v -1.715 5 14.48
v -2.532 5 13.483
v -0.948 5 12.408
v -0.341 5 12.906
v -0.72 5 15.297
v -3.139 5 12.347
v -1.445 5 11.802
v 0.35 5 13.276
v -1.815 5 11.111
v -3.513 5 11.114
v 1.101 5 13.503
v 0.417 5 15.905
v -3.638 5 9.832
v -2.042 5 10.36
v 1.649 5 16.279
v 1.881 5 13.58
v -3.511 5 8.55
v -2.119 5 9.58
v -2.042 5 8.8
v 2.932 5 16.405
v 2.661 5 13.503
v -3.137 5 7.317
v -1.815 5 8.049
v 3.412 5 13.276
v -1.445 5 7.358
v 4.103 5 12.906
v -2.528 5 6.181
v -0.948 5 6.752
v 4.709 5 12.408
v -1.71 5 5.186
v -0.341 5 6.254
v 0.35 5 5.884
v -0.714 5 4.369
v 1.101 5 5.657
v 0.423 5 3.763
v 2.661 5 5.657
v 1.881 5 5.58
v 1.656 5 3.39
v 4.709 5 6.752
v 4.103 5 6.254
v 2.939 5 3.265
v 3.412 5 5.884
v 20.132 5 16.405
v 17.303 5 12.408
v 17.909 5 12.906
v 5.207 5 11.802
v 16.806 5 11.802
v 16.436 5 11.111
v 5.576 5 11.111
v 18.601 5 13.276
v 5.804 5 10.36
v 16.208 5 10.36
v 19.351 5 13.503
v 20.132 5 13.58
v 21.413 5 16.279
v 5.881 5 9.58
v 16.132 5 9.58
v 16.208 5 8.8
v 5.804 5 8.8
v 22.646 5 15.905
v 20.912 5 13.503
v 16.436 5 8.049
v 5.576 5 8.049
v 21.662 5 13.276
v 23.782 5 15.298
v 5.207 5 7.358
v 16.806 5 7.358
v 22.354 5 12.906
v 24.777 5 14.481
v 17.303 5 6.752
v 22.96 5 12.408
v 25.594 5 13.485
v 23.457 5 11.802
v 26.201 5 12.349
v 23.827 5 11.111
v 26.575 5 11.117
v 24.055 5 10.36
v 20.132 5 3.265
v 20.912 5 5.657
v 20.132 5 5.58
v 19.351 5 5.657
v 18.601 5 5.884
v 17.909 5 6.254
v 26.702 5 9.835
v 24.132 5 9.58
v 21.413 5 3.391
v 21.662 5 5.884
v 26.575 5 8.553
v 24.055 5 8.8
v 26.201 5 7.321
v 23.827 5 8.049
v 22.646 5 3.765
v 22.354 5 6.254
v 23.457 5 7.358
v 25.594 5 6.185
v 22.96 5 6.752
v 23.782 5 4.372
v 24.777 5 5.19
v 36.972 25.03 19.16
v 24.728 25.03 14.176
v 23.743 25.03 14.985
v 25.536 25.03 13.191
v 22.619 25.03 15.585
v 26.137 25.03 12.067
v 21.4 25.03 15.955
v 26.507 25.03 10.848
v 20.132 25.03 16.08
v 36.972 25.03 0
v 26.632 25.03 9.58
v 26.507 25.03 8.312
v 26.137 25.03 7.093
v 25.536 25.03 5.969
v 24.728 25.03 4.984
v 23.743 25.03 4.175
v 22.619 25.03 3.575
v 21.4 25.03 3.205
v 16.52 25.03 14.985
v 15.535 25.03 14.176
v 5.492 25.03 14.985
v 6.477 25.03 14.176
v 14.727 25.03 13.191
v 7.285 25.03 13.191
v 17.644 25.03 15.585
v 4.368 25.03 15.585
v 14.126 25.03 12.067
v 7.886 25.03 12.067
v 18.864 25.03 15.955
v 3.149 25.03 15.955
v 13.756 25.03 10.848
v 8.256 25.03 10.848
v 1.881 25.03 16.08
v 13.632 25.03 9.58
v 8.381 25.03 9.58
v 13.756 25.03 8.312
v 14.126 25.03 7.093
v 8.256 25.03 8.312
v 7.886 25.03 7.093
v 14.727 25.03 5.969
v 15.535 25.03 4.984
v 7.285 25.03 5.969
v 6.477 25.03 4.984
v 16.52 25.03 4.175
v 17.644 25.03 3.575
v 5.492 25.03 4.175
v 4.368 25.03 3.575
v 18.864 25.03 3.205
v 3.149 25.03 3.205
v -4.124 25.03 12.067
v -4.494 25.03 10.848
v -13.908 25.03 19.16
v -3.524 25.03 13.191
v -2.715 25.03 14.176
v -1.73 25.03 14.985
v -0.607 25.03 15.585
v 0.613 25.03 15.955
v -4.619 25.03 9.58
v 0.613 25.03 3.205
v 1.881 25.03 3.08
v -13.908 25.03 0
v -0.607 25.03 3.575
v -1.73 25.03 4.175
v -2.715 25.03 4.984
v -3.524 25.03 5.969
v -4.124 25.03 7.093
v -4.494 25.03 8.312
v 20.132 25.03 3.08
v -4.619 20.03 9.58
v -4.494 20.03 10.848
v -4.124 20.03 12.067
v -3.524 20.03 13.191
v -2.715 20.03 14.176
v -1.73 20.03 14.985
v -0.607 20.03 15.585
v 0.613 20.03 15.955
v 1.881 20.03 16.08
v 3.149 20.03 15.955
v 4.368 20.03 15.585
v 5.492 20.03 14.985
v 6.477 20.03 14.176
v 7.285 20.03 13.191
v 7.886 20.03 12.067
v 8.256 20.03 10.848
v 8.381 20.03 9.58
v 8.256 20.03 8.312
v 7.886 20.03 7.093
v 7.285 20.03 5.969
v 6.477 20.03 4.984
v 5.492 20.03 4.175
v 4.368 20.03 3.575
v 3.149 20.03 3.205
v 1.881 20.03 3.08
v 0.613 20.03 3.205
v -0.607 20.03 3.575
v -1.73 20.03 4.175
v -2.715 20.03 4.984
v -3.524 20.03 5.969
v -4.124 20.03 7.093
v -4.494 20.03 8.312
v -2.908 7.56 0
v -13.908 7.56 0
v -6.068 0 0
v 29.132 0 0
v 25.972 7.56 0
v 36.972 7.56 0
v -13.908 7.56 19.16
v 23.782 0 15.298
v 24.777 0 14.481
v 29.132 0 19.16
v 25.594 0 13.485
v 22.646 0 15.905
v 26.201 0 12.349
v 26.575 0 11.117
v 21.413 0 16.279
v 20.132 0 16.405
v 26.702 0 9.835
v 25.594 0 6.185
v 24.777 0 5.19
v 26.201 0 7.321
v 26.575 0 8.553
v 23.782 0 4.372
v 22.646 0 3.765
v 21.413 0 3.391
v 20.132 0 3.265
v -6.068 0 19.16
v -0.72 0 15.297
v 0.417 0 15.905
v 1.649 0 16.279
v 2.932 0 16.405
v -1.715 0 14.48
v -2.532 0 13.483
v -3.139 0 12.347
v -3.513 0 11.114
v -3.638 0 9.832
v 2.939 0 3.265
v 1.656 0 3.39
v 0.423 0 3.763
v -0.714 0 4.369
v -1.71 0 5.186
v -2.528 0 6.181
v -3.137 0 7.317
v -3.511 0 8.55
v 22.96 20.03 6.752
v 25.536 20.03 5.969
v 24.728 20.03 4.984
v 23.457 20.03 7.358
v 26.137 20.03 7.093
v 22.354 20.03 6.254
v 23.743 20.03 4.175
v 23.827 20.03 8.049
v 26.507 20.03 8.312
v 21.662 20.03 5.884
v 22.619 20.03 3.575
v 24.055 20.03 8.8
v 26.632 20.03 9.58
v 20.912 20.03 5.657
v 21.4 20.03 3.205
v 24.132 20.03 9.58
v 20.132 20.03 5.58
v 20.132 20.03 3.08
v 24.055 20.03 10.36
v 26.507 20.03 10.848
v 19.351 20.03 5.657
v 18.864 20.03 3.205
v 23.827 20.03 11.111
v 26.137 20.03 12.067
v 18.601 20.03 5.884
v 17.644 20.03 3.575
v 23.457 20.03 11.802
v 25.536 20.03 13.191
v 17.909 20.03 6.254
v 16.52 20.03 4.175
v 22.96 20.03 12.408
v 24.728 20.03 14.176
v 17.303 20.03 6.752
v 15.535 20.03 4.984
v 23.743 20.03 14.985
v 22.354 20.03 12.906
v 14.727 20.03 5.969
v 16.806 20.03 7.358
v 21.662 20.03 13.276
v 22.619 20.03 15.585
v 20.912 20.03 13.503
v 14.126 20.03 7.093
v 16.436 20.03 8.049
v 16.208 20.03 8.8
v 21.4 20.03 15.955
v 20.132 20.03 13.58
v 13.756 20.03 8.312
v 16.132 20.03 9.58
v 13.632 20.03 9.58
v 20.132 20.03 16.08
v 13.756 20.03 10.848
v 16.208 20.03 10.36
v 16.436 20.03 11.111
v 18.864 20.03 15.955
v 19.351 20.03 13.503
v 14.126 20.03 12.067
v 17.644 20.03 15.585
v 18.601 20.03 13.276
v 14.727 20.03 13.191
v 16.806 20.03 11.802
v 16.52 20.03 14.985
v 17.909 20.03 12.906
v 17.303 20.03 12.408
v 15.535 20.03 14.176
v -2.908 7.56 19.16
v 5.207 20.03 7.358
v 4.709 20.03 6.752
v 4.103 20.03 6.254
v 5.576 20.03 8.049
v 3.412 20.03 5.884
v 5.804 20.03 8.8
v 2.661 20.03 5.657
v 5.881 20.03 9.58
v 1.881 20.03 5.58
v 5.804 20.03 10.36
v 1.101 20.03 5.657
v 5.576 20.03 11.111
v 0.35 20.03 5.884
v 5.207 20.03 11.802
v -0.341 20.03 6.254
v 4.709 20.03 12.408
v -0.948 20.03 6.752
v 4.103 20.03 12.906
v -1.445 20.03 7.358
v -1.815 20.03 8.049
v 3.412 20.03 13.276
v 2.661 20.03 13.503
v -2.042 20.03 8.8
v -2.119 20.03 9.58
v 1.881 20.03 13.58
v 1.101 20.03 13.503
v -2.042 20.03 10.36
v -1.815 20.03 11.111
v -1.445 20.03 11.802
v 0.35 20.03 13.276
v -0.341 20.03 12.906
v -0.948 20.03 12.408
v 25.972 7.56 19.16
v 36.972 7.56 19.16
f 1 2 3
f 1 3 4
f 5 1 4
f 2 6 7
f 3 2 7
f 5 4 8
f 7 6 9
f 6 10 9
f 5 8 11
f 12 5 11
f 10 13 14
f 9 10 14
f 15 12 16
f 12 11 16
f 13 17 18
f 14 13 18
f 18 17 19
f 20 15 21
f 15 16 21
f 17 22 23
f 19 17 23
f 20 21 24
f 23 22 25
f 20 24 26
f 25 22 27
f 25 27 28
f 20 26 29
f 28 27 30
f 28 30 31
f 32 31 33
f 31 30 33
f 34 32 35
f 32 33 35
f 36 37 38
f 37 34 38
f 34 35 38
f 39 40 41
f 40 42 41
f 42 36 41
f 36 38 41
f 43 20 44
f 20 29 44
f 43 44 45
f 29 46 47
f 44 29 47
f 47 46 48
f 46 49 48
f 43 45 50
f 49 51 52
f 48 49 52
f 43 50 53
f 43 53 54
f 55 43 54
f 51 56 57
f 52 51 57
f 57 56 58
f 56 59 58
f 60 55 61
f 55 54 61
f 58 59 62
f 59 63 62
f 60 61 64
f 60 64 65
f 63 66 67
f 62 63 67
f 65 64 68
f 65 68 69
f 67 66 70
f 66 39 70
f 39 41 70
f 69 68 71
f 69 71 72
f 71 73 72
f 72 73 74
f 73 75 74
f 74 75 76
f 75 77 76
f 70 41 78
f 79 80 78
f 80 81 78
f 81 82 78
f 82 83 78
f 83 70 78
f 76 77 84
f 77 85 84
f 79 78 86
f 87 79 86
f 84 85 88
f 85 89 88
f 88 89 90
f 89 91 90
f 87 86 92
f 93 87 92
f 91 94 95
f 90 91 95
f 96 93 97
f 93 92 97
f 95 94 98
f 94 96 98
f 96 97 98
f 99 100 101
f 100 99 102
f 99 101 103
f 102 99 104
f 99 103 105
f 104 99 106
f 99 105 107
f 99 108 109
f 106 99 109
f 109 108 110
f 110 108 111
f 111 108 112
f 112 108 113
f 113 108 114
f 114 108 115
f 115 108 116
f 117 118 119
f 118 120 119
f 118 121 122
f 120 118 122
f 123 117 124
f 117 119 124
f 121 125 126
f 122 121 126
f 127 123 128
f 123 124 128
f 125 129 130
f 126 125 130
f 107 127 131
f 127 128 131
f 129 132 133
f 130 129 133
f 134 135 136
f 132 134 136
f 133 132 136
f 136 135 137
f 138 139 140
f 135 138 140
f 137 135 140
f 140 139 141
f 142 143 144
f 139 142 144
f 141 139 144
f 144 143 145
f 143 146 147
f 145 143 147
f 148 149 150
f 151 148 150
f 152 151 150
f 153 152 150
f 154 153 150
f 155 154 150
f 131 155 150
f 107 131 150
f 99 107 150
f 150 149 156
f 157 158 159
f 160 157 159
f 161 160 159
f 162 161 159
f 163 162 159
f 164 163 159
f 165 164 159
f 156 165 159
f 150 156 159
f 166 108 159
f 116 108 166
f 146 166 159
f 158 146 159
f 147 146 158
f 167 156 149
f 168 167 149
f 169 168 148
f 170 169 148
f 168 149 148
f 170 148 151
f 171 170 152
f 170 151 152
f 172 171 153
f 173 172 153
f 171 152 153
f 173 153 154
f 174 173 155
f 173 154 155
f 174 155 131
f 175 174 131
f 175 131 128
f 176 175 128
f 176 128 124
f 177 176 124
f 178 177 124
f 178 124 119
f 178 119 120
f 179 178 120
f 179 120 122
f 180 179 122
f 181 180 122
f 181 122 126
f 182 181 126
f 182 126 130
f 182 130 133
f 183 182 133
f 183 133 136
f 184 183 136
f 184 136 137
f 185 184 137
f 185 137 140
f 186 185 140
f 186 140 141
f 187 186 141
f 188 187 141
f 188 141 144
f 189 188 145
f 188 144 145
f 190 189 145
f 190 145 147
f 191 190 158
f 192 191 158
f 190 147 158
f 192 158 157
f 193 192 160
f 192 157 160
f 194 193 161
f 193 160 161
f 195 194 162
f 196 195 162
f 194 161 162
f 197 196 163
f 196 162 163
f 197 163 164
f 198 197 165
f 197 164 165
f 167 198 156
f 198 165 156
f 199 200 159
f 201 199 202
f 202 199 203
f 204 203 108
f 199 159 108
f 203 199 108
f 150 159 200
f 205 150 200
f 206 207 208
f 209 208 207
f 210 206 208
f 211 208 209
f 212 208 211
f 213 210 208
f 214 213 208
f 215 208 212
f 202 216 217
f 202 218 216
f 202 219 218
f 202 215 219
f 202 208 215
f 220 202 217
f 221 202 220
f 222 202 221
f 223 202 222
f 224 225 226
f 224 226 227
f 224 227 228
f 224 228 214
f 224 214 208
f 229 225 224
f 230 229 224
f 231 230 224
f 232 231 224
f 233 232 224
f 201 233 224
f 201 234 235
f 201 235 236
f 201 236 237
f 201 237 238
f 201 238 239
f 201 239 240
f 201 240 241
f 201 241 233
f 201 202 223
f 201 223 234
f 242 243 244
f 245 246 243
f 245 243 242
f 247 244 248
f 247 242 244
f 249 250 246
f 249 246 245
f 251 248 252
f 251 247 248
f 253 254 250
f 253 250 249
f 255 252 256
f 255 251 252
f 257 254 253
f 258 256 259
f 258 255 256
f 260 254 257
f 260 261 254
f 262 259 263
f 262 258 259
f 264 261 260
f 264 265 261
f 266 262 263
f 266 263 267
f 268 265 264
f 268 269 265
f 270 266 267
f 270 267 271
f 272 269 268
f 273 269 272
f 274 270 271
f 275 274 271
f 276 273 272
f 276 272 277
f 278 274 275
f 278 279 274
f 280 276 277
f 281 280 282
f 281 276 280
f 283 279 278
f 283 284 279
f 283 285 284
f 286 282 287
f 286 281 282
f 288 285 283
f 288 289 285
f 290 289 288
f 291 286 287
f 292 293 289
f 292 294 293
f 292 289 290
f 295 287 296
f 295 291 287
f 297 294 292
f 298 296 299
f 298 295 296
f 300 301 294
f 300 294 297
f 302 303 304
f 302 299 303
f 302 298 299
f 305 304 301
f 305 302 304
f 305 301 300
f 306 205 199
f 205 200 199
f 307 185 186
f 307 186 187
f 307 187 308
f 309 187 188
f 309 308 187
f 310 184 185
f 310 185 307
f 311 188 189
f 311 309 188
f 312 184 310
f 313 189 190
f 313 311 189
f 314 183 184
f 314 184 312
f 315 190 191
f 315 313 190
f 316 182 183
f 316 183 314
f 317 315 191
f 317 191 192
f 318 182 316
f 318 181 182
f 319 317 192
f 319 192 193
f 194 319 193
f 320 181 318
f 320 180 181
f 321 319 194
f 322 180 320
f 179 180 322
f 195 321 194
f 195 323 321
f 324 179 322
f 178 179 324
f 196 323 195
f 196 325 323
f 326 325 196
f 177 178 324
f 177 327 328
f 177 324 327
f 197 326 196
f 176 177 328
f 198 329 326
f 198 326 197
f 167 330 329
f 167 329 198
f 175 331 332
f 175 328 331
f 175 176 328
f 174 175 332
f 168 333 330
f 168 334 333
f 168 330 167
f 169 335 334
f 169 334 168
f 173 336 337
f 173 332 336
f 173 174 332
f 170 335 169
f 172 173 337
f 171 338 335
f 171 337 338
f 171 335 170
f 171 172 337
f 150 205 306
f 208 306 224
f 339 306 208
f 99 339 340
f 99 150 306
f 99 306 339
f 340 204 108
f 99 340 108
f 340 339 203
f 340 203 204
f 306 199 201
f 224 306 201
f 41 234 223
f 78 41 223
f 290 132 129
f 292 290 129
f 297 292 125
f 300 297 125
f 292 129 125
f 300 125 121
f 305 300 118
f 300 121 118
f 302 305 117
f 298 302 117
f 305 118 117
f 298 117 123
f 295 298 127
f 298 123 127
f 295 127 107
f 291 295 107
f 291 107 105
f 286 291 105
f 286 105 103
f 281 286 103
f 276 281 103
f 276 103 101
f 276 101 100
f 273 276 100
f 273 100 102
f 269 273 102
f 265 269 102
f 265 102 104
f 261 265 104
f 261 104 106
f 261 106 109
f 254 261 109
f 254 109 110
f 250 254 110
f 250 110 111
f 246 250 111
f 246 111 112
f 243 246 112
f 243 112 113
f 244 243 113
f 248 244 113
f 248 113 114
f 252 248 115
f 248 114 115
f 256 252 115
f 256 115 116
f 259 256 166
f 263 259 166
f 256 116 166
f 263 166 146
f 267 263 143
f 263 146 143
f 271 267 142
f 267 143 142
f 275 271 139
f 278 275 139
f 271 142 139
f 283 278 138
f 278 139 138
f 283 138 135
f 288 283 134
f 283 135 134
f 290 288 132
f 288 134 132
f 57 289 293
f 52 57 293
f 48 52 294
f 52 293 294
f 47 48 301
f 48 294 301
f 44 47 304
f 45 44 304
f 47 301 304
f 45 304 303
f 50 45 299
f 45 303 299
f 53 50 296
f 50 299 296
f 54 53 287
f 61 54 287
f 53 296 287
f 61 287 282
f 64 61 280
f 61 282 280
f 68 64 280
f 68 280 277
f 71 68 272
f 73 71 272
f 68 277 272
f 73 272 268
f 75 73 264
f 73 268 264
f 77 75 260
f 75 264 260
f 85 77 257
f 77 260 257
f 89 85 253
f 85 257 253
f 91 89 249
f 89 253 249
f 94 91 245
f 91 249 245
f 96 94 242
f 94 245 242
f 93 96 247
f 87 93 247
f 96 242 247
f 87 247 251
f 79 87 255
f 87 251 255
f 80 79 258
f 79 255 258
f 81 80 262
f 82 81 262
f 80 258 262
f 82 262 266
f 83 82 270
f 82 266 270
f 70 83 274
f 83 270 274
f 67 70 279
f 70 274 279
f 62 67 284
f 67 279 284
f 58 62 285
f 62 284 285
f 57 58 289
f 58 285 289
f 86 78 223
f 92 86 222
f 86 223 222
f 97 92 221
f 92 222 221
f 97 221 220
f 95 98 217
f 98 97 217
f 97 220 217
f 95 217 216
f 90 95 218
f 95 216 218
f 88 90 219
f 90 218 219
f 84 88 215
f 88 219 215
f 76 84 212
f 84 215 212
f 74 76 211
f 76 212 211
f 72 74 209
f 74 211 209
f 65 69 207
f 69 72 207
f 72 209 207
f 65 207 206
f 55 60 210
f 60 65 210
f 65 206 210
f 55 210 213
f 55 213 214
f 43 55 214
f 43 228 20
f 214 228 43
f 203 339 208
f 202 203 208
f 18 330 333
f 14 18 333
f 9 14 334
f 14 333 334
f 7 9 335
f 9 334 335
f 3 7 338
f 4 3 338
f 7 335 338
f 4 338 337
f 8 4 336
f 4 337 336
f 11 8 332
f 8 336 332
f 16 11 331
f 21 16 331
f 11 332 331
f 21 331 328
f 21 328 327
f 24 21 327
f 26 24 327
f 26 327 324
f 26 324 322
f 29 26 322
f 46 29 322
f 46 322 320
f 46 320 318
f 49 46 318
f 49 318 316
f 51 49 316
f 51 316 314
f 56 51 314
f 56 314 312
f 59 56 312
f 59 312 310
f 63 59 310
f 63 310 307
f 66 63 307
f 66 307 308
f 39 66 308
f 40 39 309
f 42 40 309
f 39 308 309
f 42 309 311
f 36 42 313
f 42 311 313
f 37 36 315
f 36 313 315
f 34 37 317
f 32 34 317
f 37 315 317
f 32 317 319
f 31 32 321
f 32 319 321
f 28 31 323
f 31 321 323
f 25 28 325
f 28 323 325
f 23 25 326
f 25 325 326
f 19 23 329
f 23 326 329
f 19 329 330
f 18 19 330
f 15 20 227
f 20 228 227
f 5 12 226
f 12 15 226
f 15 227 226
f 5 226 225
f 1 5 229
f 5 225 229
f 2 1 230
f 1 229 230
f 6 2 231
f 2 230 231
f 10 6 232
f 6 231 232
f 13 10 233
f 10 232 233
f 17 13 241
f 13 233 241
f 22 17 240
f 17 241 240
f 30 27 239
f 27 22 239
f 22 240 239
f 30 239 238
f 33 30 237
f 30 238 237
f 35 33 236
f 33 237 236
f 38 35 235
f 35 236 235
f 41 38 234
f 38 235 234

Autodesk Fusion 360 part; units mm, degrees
sketch "Sketch1" plane through (0, 0, 0) normal (0, 0, 1) x (1, 0, 0)
  line L0 (-13.9084, 7.56) -> (36.9716, 7.56)
  line L1 (36.9716, 7.56) -> (36.9716, 25.03)
  line L2 (36.9716, 25.03) -> (-13.9084, 25.03)
  line L3 (-13.9084, 25.03) -> (-13.9084, 7.56)
  line L4 (-13.9084, 7.56) -> (-2.9084, 7.56) construction
  line L5 (36.9716, 7.56) -> (25.9716, 7.56) construction
  dimension "d4" = 50.88
  dimension "d5" = 17.47
  dimension "d7" = 11
  dimension "d8" = 11
sketch "Sketch2" plane through (0, 0, 0) normal (0, 0, 1) x (1, 0, 0)
  line L0 (11.5316, 0) -> (29.1316, 0)
  line L1 (11.5316, 0) -> (-6.0684, 0)
  line L2 (-13.9084, 7.56) -> (36.9716, 7.56)
  line L3 (-2.9084, 7.56) -> (-6.0684, 0)
  line L4 (25.9716, 7.56) -> (29.1316, 0)
  point P0 (-2.9084, 7.56)
  point P1 (25.9716, 7.56)
  dimension "d9" = 17.6
  dimension "d10" = 17.6
  dimension "d11" = 7.56
extrude "Extrude1" add sketch "Sketch1" sketch "Sketch2" along normal blind 19.16 of sketch 2
sketch "Sketch4" plane through (0, 0, 0) normal (0, 1, 0) x (1, 0, 0)
  circle A0 centre (2.9316, -9.8352) radius 6.57
  line L0 (-6.0684, 0) -> (-6.0684, -19.16)
  circle A1 centre (20.1316, -9.8352) radius 6.57
  line L1 (29.1316, 0) -> (29.1316, -19.16)
  line L2 (2.9316, -16.4052) -> (20.1316, -16.4052)
  line L3 (2.9387, -3.2652) -> (20.1316, -3.2652)
  dimension "d14" = 13.14
  dimension "d16" = 13.14
  dimension "d17" = 9
  dimension "d18" = 9
extrude "Extrude2" cut sketch "Sketch4" along normal blind 5
sketch "Sketch5" plane through (0, 25.03, 0) normal (0, 1, 0) x (-1, 0, 0)
  line L0 (-36.9716, 0) -> (13.9084, 0)
  line L1 (13.9084, 0) -> (13.9084, 19.16)
  line L2 (13.9084, 19.16) -> (-36.9716, 19.16)
  line L3 (-36.9716, 19.16) -> (-36.9716, 0)
  circle A0 centre (-20.1316, 9.58) radius 6.5
  circle A1 centre (-1.8809, 9.58) radius 6.5
  circle A2 centre (-20.1316, 9.58) radius 4
  circle A3 centre (-1.8809, 9.58) radius 4
  dimension "d21" = 13
  dimension "d22" = 13
  dimension "d24" = 9.58
  dimension "d25" = 9.58
  dimension "d26" = 8
  dimension "d27" = 8
extrude "Extrude3" cut sketch "Sketch5" against normal blind 5 contours A0 | A1
extrude "Extrude4" cut 2 faces at (2.6679, 25.03, 7.9458) (19.0151, 25.03, 9.0276) along direction (0, 1, 0) up to surface end surface through (0, 5, 0) normal (0, -1, 0) offset 0
equation "d12 = thickness"
equation "d19 = boltSink"
equation "d21 = boltH"
equation "d22 = boltH"
equation "thickness = 19.16 mm"
equation "d24 = ( 19.16 / 2 ) * 1 mm"
equation "d26 = bolt"
equation "d27 = bolt"
equation "boltH = 13 mm"
equation "boltSink = 5 mm"
equation "bolt = 8 mm"
